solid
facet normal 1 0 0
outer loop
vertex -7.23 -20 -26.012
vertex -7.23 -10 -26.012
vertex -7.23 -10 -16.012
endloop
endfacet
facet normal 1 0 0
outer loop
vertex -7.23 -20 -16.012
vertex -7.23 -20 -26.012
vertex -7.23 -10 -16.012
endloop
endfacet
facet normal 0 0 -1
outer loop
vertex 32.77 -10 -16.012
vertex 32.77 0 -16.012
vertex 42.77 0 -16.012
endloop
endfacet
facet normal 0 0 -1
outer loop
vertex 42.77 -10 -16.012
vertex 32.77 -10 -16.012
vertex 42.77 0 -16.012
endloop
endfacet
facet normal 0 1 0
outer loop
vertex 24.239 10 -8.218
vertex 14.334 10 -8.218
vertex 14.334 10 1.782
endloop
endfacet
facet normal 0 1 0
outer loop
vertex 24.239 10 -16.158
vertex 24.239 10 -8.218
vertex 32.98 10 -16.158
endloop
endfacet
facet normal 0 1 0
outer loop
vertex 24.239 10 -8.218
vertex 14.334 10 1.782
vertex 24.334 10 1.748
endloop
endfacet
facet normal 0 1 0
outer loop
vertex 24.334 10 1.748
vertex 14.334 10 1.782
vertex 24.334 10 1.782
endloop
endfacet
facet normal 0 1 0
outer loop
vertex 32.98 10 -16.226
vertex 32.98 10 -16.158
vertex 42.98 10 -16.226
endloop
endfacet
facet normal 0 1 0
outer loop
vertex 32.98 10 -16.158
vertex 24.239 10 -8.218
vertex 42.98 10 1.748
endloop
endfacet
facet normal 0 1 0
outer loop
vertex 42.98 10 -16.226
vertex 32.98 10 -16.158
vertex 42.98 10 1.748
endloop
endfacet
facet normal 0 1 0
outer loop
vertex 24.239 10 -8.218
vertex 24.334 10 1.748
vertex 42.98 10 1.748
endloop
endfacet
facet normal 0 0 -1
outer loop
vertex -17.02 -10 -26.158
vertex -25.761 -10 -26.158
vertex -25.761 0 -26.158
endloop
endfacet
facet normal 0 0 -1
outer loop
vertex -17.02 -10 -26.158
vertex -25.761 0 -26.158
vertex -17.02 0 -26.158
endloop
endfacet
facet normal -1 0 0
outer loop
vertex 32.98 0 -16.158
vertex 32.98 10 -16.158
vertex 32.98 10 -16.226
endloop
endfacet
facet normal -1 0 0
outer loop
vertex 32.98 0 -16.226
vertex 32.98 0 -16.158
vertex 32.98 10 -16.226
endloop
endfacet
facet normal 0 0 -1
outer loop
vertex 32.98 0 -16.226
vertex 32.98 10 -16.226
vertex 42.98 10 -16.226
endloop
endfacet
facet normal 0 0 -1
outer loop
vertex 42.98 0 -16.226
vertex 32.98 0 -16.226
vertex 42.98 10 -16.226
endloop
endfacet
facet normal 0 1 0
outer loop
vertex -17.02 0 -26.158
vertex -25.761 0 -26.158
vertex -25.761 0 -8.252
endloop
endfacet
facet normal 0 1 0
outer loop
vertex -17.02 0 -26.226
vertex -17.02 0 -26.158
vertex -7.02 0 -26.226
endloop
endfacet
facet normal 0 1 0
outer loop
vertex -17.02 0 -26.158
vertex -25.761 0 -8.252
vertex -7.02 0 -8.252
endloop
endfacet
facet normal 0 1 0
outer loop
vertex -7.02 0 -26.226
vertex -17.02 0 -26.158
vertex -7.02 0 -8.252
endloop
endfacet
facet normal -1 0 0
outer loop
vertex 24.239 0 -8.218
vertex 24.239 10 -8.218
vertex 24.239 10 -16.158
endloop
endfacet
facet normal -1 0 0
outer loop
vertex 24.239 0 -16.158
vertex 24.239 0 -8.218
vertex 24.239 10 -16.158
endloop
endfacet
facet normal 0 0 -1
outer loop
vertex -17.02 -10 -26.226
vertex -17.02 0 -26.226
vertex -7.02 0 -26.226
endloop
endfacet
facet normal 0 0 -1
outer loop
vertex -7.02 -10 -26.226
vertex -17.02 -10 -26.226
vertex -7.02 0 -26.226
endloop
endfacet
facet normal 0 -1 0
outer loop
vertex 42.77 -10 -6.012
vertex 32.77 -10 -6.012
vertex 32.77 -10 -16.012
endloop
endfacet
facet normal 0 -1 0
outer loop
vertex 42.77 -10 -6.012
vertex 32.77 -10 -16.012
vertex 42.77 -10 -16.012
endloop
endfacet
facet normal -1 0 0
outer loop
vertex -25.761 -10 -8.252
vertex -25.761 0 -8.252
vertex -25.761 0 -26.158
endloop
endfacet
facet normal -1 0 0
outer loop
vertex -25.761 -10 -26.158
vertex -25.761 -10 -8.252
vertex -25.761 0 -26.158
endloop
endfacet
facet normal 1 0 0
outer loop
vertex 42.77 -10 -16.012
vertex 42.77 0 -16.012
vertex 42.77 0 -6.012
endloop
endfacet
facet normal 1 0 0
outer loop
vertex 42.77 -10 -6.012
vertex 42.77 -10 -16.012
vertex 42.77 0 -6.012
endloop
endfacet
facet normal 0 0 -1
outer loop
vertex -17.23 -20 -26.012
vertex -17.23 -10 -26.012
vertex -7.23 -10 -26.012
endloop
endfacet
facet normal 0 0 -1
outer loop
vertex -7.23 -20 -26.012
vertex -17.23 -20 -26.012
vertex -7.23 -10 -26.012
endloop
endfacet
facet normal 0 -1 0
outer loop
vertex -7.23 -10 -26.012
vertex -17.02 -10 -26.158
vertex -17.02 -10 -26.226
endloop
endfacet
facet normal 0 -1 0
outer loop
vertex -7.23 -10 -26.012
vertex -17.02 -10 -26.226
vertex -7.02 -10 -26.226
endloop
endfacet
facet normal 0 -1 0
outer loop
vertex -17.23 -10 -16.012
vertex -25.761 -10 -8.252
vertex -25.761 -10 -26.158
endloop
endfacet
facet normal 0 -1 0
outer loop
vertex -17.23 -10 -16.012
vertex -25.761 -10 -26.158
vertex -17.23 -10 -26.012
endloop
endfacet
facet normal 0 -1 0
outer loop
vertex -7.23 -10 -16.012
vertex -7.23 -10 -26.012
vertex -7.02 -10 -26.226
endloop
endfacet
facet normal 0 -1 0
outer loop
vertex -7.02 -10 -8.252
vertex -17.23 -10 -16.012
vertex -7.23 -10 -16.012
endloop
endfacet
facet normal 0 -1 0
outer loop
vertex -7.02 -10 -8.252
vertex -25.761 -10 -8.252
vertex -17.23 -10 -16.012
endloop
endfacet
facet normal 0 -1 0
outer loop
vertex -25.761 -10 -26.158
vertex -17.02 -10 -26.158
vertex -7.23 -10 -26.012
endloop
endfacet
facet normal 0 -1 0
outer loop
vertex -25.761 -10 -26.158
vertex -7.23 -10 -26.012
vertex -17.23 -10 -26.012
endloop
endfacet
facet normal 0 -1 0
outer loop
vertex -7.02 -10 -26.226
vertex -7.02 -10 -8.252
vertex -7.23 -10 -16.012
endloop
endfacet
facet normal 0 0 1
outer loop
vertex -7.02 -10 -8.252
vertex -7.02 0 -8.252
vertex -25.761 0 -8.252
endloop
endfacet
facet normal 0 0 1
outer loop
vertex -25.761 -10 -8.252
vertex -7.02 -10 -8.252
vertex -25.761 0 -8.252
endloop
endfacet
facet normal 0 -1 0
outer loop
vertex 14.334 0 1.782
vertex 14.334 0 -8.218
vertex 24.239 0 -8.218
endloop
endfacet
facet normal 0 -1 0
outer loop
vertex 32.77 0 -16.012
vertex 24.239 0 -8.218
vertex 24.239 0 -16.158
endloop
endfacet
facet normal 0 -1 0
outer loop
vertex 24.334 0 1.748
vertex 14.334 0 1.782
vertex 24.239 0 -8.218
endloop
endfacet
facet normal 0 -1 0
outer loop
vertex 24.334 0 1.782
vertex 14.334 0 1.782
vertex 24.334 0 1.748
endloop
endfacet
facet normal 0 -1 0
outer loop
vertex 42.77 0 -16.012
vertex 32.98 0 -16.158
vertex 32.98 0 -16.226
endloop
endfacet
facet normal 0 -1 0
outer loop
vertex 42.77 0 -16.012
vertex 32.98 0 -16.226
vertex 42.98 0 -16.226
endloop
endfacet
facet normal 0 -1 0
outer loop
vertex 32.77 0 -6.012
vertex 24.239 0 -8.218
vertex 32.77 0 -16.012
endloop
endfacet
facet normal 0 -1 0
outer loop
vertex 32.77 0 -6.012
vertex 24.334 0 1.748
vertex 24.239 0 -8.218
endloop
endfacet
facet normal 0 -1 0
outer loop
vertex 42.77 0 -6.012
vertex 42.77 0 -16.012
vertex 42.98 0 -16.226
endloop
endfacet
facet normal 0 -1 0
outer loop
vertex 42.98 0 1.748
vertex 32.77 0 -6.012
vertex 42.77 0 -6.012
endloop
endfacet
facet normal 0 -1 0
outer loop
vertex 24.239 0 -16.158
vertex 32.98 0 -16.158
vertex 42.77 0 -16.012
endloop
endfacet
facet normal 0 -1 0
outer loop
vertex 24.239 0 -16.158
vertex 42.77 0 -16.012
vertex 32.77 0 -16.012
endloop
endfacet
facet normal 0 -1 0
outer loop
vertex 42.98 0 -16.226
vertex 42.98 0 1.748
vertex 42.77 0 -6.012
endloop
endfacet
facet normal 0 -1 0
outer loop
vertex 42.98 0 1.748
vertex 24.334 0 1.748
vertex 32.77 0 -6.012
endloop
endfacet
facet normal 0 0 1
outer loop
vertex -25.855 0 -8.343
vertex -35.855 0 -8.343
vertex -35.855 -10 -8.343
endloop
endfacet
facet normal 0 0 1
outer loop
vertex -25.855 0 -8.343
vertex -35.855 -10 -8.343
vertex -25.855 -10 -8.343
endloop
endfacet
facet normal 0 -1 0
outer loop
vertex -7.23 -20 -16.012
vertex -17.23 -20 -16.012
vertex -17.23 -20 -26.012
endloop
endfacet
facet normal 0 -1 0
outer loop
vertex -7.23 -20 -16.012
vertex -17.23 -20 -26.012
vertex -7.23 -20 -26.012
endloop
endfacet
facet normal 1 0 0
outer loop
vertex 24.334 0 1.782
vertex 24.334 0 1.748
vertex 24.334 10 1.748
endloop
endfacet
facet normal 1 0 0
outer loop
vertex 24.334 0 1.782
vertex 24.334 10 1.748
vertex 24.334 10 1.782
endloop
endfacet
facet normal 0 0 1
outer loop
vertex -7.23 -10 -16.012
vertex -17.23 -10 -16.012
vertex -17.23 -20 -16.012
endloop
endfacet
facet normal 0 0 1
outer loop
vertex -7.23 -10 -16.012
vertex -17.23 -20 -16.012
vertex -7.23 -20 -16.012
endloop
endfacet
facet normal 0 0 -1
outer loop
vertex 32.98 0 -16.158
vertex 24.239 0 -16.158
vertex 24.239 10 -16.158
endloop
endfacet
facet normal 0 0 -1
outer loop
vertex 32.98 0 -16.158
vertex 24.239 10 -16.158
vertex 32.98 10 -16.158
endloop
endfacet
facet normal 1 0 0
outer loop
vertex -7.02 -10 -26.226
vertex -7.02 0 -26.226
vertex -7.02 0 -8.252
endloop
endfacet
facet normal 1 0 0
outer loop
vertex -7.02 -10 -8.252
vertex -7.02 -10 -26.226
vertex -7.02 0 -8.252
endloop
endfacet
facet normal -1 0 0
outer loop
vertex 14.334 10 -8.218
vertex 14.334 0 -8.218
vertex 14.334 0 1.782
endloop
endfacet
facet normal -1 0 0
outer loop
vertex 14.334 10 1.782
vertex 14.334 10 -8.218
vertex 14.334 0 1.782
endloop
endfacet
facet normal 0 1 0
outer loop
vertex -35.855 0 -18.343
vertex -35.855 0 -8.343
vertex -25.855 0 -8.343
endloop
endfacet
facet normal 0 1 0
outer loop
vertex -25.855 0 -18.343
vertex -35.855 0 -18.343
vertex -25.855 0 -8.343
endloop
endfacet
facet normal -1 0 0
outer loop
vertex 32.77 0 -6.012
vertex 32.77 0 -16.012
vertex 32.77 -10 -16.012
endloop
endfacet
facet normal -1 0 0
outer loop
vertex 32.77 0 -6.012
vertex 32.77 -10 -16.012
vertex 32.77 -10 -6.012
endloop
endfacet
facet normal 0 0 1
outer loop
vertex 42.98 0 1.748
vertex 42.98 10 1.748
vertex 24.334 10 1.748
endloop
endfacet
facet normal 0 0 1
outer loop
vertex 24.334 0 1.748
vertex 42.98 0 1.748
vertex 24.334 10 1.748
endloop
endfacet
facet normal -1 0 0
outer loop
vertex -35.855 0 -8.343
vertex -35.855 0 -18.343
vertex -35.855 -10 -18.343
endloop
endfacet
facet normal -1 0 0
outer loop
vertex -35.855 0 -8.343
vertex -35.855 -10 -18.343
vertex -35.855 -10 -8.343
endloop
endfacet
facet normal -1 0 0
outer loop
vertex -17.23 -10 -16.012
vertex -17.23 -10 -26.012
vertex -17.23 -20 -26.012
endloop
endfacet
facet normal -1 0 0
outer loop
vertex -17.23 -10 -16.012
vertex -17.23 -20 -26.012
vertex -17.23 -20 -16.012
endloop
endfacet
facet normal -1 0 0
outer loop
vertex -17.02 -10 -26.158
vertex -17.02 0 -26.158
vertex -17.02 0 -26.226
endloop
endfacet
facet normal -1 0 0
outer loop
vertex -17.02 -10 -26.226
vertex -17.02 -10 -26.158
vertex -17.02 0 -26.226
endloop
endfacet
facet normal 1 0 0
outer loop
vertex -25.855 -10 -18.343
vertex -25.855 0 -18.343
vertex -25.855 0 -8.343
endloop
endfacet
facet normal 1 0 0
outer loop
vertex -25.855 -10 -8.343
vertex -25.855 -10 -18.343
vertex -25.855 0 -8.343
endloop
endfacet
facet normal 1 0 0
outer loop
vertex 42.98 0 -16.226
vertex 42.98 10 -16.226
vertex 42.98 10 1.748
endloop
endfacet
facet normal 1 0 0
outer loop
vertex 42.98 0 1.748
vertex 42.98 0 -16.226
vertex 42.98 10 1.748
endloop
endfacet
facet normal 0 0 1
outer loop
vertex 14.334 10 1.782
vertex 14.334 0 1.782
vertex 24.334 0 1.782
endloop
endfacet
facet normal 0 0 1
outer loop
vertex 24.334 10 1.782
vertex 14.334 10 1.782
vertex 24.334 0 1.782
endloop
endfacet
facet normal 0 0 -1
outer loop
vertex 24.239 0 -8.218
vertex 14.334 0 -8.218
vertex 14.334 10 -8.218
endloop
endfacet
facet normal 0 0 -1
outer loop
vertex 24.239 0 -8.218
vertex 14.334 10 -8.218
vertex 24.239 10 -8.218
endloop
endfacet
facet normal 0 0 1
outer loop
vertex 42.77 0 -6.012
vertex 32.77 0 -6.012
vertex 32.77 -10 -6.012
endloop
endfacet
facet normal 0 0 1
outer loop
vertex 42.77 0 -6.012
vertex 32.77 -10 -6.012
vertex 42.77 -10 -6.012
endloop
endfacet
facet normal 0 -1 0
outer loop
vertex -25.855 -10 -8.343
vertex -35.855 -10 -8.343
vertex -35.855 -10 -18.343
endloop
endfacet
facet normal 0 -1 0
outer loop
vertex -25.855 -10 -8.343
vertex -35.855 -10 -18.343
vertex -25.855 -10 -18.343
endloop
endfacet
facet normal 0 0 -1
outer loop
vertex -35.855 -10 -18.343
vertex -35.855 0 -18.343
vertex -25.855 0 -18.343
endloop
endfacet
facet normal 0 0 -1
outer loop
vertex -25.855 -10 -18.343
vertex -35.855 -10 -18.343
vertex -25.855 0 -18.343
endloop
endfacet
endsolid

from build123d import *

# Parameters (mm, degrees)
F0_W     = 8.7418866134
F0_H     = 9.1640796146
F0_H_2   = 8.7418866134
F1_DEPTH = 10
F2_W     = 10
F2_H     = 10
F3_DEPTH = 10
F4_W     = 10
F4_H     = 10
F5_DEPTH = 20
F7_W     = 10
F7_H     = 10
F8_DEPTH = 10


with BuildPart() as f1:
    # F0 (on Front) → F1 (new body)
    with BuildSketch(Plane.XZ):
        with Locations((-21.3905060912, -12.8338585444)):
            Rectangle(F0_W, F0_H)
        with Locations((-21.3905060912, -21.7868416584)):
            Rectangle(F0_W, F0_H_2)
        Polygon((-17.0195627845, -8.2518187371), (-17.0195627845, -17.4158983517), (-17.0195627845, -26.1577849651), (-17.0195627845, -26.2256928669), (-7.0195627845, -26.2256928669), (-7.0195627845, -8.2518187371), align=None)
    extrude(amount=F1_DEPTH)

    # F4 (on Front) → F5 (join)
    with BuildSketch(Plane.XZ):
        with Locations((-12.2296868358, -21.0118762836)):
            Rectangle(F4_W, F4_H)
    extrude(amount=F5_DEPTH)


with BuildPart() as f3:
    # F2 (on Front) → F3 (new body)
    with BuildSketch(Plane.XZ):
        with Locations((-30.8545911685, -13.3431641402)):
            Rectangle(F2_W, F2_H)
    extrude(amount=F3_DEPTH)


with BuildPart() as f6_1:
    # F6: copy of F1
    add(f1.part.moved(Location((50, 10, 10))))

    # F7 (on Front) → F8 (join)
    with BuildSketch(Plane.XZ):
        with Locations((19.3341116374, -3.2180631533)):
            Rectangle(F7_W, F7_H)
    extrude(amount=-F8_DEPTH)


solid = Compound([f1.part, f3.part, f6_1.part])
